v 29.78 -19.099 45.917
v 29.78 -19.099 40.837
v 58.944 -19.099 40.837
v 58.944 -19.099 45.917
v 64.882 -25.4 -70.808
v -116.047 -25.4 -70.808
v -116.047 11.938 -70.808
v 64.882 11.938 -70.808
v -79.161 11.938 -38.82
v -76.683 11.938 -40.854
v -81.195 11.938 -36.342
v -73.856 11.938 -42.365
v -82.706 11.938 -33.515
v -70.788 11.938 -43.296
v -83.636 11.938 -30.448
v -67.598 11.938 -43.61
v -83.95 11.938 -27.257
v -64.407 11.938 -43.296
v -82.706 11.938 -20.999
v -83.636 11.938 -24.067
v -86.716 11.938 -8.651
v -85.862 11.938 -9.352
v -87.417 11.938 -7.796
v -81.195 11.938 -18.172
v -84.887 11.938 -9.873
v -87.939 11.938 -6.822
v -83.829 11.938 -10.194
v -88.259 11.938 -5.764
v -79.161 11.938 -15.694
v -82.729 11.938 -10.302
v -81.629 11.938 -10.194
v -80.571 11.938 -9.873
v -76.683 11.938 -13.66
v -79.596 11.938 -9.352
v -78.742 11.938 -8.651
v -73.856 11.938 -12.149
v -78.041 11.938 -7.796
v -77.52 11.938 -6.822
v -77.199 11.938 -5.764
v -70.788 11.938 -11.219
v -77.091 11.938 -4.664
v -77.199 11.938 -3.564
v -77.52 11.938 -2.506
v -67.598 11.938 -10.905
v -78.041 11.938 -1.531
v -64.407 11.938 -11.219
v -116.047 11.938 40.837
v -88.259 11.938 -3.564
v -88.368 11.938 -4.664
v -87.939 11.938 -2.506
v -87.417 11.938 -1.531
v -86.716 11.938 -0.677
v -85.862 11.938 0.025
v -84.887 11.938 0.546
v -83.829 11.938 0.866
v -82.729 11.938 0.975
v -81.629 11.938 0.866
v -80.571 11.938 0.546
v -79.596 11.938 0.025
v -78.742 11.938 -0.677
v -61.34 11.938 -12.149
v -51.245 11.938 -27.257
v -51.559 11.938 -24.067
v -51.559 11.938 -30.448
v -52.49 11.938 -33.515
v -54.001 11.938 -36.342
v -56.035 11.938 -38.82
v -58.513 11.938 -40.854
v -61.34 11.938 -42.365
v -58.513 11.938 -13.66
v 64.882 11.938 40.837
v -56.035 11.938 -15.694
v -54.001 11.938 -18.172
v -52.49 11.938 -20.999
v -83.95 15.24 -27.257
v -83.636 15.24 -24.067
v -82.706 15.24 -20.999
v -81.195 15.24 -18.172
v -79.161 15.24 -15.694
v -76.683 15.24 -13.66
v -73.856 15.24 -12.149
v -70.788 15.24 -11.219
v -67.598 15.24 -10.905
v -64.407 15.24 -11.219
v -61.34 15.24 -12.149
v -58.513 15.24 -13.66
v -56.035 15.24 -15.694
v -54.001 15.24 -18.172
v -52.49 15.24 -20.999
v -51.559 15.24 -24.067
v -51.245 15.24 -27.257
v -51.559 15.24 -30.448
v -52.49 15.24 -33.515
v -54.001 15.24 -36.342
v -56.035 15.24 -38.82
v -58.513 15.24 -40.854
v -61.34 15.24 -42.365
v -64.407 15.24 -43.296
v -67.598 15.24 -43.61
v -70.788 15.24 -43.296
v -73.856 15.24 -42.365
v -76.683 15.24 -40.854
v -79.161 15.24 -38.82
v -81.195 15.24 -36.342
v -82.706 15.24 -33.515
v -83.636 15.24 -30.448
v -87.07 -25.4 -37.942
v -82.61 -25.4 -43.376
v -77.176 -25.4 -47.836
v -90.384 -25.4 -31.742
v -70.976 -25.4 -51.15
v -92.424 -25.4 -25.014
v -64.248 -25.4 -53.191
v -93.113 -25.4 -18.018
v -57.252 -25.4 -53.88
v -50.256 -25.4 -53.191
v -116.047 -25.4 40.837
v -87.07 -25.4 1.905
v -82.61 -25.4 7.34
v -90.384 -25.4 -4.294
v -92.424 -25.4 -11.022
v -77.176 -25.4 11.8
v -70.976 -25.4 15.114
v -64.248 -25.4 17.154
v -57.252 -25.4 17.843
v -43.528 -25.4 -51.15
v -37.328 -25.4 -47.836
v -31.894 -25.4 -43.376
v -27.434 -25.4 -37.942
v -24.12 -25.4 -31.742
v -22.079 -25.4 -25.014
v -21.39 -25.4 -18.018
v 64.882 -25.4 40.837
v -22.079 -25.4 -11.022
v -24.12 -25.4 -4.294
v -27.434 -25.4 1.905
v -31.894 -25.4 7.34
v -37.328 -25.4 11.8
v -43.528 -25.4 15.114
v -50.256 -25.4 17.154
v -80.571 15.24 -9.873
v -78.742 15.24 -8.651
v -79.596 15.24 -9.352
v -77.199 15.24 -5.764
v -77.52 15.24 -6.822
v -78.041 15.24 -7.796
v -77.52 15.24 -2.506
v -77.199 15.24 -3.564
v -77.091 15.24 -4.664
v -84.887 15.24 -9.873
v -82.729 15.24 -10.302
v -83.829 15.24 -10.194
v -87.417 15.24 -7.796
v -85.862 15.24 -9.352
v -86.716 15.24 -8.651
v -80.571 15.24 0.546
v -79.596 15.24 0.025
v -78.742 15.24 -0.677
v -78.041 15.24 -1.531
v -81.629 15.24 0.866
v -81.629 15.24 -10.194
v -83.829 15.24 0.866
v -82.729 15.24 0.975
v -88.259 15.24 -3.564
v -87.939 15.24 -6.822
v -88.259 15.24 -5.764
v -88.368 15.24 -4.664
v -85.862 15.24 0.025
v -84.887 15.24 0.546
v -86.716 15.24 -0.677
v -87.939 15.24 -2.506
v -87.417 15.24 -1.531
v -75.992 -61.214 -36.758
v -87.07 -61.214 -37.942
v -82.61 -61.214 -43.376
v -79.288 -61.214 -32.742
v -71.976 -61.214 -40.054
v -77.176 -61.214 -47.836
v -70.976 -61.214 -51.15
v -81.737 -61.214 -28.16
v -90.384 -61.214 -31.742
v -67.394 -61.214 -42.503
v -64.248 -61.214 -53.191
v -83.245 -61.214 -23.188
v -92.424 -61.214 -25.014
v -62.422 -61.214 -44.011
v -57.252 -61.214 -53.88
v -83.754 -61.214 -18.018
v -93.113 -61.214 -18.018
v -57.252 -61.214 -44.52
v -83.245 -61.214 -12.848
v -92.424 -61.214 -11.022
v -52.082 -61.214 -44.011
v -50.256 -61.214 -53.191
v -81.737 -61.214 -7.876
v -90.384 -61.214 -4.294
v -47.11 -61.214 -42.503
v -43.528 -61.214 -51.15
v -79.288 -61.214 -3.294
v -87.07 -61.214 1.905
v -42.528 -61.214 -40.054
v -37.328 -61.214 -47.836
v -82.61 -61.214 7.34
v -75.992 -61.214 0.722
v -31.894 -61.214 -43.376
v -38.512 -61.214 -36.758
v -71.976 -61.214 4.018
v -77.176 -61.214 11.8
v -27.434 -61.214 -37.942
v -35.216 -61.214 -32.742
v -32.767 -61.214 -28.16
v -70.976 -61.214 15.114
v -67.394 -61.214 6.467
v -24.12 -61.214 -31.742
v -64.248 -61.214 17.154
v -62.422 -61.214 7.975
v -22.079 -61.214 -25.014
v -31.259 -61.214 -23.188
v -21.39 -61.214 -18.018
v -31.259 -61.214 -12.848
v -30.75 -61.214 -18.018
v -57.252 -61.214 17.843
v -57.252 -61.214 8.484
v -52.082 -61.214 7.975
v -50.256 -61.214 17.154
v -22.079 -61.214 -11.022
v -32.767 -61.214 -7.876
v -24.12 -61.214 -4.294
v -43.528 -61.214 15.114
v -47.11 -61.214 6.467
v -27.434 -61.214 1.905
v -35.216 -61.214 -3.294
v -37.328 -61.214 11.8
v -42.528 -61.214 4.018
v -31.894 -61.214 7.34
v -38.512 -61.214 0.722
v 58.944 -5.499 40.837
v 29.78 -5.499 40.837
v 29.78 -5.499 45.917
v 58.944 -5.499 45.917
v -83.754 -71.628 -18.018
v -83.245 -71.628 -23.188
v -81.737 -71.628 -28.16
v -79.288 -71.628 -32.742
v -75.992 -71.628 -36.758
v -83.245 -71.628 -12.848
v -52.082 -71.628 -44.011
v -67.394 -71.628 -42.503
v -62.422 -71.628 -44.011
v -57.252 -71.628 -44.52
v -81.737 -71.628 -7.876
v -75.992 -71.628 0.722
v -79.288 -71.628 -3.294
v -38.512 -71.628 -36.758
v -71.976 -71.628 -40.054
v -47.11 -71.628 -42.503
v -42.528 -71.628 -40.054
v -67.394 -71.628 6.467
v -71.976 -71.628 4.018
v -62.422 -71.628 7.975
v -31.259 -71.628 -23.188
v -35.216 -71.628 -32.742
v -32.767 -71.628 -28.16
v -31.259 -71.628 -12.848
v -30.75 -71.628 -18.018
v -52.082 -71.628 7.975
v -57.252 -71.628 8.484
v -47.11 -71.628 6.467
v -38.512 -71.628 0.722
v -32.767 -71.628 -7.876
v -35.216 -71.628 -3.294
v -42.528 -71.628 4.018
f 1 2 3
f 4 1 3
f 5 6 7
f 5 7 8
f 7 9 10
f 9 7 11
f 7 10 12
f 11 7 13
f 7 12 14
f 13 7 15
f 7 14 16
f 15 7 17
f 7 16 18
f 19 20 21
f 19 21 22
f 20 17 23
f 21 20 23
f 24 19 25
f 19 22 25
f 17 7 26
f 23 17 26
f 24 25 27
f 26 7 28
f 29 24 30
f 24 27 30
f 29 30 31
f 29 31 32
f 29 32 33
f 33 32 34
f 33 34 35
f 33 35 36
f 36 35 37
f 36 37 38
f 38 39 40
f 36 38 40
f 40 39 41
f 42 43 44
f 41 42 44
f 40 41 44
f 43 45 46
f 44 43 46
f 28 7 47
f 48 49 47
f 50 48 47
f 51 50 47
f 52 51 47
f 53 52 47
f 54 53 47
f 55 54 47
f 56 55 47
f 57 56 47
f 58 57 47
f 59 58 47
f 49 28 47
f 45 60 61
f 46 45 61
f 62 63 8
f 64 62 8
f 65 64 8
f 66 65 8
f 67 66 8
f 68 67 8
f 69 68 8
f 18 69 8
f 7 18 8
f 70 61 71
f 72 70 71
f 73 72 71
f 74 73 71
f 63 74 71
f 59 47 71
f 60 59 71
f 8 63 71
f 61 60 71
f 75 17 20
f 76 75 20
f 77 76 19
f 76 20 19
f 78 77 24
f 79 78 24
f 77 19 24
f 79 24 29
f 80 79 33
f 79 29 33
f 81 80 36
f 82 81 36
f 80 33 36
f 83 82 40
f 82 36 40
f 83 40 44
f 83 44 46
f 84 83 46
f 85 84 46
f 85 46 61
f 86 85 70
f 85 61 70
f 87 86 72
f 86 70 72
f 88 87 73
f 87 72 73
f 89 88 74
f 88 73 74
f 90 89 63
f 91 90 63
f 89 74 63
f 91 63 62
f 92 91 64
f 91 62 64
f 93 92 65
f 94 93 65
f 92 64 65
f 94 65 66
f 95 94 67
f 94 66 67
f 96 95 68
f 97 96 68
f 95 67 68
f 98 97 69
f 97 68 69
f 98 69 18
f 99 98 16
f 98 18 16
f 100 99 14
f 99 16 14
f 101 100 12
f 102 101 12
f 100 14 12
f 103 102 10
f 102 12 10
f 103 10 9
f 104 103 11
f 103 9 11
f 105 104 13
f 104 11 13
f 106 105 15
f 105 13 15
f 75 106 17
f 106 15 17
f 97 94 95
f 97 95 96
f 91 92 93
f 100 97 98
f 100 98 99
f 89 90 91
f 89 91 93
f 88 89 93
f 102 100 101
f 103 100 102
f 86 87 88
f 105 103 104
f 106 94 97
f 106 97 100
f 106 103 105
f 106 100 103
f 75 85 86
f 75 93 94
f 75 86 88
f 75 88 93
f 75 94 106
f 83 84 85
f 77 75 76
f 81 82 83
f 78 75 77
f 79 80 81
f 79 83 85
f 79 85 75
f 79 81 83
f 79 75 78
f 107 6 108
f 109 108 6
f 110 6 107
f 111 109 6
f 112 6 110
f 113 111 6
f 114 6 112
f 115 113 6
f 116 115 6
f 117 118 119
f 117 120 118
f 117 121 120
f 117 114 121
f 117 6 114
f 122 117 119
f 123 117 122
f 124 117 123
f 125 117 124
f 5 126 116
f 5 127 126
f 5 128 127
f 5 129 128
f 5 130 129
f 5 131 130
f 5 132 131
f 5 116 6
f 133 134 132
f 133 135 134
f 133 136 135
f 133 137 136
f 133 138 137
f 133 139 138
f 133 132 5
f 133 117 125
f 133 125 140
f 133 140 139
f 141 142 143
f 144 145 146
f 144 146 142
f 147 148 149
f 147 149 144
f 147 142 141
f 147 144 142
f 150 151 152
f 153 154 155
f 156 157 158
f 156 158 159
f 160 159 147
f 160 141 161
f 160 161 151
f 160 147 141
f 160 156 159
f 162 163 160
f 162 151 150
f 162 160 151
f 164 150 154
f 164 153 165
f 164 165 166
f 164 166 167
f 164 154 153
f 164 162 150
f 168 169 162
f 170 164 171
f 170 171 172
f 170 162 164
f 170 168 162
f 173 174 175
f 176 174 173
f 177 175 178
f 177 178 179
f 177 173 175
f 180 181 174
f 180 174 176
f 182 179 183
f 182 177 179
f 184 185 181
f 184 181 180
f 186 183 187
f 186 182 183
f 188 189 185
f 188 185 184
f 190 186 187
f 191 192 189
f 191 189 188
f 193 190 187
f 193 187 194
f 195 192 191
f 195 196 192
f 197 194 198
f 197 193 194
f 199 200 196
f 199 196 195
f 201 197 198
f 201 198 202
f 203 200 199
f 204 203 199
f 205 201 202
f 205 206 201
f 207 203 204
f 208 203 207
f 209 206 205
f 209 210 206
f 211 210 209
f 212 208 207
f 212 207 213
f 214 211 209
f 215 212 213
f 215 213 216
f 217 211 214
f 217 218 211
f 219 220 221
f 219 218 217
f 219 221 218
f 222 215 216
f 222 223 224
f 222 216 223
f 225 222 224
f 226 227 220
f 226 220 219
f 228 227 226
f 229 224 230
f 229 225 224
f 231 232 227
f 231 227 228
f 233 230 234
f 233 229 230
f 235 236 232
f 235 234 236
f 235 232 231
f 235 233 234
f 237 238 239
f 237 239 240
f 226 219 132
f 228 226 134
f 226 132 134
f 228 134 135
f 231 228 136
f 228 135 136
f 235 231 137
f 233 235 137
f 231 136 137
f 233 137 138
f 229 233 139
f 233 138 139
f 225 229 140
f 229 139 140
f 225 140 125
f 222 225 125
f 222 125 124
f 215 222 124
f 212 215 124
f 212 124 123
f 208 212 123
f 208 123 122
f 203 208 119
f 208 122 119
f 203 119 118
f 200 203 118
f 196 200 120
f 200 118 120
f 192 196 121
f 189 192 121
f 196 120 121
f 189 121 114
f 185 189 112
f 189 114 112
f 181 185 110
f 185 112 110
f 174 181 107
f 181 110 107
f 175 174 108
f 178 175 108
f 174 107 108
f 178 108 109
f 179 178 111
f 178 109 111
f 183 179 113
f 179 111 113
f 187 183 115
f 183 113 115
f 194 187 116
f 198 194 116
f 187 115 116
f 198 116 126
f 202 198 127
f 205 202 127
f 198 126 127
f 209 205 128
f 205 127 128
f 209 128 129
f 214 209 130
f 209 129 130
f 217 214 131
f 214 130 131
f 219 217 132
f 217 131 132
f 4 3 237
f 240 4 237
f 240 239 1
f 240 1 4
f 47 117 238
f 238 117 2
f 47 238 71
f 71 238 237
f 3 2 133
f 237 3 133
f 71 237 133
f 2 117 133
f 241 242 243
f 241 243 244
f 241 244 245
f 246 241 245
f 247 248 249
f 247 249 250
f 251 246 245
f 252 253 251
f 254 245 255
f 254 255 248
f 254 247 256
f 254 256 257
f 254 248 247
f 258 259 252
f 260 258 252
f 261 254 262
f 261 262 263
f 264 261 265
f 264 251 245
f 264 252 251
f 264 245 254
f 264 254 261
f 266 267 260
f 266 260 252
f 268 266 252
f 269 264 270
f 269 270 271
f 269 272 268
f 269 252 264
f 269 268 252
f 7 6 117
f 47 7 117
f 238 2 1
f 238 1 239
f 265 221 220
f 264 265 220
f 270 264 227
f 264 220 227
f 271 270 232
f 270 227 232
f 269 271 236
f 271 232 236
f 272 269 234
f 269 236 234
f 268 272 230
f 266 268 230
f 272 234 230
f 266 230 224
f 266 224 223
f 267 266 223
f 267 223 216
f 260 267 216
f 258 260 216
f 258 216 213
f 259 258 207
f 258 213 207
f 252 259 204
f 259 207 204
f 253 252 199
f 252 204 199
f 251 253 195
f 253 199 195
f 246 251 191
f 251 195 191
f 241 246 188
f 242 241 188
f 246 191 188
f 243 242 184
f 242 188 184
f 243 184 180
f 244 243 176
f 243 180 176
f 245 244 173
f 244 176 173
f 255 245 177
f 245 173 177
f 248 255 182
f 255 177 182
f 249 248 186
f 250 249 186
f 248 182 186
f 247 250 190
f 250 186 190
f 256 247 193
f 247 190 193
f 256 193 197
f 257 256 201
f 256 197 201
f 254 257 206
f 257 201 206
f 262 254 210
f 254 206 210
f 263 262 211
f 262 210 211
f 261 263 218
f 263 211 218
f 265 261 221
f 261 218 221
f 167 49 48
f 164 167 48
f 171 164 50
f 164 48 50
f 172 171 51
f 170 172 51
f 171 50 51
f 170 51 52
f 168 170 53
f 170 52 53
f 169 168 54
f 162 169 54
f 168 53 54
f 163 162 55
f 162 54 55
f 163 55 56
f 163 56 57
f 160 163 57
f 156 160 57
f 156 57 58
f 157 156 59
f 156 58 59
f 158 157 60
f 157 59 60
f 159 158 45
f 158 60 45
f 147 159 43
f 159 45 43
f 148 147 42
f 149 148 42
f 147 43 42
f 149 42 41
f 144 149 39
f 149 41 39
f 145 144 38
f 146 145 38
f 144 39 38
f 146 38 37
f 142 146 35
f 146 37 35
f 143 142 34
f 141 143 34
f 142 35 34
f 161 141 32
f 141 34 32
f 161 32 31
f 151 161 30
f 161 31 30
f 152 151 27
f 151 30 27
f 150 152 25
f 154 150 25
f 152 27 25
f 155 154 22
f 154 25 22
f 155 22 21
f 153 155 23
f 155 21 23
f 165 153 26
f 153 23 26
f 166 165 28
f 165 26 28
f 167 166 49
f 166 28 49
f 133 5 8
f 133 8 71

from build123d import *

# Parameters (mm, degrees)
F0_W      = 180.9290349483
F0_H      = 111.6445362568
F1_DEPTH  = 25.4
F2_R      = 35.8615179987
F3_DEPTH  = 35.814
F4_R      = 26.5022456756
F5_DEPTH  = 10.414
F6_W      = 29.163653031
F6_H      = 13.6000299826
F7_DEPTH  = 5.08
F8_DEPTH  = 11.938
F10_R     = 16.3527851641
F10_R_2   = 5.6386158943
F11_DEPTH = 3.302


with BuildPart() as f1:
    # F0 (on Front) → F1 (new body)
    with BuildSketch(Plane.XZ):
        with Locations((-25.5821794271, -14.9854421616)):
            Rectangle(F0_W, F0_H)
    extrude(amount=F1_DEPTH)

    # F2 (on face) → F3 (join)
    with BuildSketch(Plane.XZ.offset(25.4)):
        with Locations((-57.2519302368, -18.0181078613)):
            Circle(F2_R)
    extrude(amount=F3_DEPTH)

    # F4 (on face) → F5 (join)
    with BuildSketch(Plane.XZ.offset(61.214)):
        with Locations((-57.2519302368, -18.0181078613)):
            Circle(F4_R)
    extrude(amount=F5_DEPTH)

    # F6 (on face) → F7 (join)
    with BuildSketch(Plane.XY.offset(40.8368259668)):
        with Locations((44.361977838, -12.2991851531)):
            Rectangle(F6_W, F6_H)
    extrude(amount=F7_DEPTH)

    # F8 (add): a face of the model
    f8_faces = [f1.faces().sort_by_distance(p)[0] for p in [
        (-25.5821794271, 0, -14.9854421616),
    ]]
    extrude(f8_faces, amount=F8_DEPTH)

    # F10 (on face) → F11 (join)
    with BuildSketch(Plane(origin=(0, 11.938, 0), x_dir=(-1, 0, 0), z_dir=(0, 1, 0))):
        with Locations((67.5977021456, -27.2572916001)):
            Circle(F10_R)
        with Locations((82.7291309834, -4.6637952328)):
            Circle(F10_R_2)
    extrude(amount=F11_DEPTH)


solid = f1.part
